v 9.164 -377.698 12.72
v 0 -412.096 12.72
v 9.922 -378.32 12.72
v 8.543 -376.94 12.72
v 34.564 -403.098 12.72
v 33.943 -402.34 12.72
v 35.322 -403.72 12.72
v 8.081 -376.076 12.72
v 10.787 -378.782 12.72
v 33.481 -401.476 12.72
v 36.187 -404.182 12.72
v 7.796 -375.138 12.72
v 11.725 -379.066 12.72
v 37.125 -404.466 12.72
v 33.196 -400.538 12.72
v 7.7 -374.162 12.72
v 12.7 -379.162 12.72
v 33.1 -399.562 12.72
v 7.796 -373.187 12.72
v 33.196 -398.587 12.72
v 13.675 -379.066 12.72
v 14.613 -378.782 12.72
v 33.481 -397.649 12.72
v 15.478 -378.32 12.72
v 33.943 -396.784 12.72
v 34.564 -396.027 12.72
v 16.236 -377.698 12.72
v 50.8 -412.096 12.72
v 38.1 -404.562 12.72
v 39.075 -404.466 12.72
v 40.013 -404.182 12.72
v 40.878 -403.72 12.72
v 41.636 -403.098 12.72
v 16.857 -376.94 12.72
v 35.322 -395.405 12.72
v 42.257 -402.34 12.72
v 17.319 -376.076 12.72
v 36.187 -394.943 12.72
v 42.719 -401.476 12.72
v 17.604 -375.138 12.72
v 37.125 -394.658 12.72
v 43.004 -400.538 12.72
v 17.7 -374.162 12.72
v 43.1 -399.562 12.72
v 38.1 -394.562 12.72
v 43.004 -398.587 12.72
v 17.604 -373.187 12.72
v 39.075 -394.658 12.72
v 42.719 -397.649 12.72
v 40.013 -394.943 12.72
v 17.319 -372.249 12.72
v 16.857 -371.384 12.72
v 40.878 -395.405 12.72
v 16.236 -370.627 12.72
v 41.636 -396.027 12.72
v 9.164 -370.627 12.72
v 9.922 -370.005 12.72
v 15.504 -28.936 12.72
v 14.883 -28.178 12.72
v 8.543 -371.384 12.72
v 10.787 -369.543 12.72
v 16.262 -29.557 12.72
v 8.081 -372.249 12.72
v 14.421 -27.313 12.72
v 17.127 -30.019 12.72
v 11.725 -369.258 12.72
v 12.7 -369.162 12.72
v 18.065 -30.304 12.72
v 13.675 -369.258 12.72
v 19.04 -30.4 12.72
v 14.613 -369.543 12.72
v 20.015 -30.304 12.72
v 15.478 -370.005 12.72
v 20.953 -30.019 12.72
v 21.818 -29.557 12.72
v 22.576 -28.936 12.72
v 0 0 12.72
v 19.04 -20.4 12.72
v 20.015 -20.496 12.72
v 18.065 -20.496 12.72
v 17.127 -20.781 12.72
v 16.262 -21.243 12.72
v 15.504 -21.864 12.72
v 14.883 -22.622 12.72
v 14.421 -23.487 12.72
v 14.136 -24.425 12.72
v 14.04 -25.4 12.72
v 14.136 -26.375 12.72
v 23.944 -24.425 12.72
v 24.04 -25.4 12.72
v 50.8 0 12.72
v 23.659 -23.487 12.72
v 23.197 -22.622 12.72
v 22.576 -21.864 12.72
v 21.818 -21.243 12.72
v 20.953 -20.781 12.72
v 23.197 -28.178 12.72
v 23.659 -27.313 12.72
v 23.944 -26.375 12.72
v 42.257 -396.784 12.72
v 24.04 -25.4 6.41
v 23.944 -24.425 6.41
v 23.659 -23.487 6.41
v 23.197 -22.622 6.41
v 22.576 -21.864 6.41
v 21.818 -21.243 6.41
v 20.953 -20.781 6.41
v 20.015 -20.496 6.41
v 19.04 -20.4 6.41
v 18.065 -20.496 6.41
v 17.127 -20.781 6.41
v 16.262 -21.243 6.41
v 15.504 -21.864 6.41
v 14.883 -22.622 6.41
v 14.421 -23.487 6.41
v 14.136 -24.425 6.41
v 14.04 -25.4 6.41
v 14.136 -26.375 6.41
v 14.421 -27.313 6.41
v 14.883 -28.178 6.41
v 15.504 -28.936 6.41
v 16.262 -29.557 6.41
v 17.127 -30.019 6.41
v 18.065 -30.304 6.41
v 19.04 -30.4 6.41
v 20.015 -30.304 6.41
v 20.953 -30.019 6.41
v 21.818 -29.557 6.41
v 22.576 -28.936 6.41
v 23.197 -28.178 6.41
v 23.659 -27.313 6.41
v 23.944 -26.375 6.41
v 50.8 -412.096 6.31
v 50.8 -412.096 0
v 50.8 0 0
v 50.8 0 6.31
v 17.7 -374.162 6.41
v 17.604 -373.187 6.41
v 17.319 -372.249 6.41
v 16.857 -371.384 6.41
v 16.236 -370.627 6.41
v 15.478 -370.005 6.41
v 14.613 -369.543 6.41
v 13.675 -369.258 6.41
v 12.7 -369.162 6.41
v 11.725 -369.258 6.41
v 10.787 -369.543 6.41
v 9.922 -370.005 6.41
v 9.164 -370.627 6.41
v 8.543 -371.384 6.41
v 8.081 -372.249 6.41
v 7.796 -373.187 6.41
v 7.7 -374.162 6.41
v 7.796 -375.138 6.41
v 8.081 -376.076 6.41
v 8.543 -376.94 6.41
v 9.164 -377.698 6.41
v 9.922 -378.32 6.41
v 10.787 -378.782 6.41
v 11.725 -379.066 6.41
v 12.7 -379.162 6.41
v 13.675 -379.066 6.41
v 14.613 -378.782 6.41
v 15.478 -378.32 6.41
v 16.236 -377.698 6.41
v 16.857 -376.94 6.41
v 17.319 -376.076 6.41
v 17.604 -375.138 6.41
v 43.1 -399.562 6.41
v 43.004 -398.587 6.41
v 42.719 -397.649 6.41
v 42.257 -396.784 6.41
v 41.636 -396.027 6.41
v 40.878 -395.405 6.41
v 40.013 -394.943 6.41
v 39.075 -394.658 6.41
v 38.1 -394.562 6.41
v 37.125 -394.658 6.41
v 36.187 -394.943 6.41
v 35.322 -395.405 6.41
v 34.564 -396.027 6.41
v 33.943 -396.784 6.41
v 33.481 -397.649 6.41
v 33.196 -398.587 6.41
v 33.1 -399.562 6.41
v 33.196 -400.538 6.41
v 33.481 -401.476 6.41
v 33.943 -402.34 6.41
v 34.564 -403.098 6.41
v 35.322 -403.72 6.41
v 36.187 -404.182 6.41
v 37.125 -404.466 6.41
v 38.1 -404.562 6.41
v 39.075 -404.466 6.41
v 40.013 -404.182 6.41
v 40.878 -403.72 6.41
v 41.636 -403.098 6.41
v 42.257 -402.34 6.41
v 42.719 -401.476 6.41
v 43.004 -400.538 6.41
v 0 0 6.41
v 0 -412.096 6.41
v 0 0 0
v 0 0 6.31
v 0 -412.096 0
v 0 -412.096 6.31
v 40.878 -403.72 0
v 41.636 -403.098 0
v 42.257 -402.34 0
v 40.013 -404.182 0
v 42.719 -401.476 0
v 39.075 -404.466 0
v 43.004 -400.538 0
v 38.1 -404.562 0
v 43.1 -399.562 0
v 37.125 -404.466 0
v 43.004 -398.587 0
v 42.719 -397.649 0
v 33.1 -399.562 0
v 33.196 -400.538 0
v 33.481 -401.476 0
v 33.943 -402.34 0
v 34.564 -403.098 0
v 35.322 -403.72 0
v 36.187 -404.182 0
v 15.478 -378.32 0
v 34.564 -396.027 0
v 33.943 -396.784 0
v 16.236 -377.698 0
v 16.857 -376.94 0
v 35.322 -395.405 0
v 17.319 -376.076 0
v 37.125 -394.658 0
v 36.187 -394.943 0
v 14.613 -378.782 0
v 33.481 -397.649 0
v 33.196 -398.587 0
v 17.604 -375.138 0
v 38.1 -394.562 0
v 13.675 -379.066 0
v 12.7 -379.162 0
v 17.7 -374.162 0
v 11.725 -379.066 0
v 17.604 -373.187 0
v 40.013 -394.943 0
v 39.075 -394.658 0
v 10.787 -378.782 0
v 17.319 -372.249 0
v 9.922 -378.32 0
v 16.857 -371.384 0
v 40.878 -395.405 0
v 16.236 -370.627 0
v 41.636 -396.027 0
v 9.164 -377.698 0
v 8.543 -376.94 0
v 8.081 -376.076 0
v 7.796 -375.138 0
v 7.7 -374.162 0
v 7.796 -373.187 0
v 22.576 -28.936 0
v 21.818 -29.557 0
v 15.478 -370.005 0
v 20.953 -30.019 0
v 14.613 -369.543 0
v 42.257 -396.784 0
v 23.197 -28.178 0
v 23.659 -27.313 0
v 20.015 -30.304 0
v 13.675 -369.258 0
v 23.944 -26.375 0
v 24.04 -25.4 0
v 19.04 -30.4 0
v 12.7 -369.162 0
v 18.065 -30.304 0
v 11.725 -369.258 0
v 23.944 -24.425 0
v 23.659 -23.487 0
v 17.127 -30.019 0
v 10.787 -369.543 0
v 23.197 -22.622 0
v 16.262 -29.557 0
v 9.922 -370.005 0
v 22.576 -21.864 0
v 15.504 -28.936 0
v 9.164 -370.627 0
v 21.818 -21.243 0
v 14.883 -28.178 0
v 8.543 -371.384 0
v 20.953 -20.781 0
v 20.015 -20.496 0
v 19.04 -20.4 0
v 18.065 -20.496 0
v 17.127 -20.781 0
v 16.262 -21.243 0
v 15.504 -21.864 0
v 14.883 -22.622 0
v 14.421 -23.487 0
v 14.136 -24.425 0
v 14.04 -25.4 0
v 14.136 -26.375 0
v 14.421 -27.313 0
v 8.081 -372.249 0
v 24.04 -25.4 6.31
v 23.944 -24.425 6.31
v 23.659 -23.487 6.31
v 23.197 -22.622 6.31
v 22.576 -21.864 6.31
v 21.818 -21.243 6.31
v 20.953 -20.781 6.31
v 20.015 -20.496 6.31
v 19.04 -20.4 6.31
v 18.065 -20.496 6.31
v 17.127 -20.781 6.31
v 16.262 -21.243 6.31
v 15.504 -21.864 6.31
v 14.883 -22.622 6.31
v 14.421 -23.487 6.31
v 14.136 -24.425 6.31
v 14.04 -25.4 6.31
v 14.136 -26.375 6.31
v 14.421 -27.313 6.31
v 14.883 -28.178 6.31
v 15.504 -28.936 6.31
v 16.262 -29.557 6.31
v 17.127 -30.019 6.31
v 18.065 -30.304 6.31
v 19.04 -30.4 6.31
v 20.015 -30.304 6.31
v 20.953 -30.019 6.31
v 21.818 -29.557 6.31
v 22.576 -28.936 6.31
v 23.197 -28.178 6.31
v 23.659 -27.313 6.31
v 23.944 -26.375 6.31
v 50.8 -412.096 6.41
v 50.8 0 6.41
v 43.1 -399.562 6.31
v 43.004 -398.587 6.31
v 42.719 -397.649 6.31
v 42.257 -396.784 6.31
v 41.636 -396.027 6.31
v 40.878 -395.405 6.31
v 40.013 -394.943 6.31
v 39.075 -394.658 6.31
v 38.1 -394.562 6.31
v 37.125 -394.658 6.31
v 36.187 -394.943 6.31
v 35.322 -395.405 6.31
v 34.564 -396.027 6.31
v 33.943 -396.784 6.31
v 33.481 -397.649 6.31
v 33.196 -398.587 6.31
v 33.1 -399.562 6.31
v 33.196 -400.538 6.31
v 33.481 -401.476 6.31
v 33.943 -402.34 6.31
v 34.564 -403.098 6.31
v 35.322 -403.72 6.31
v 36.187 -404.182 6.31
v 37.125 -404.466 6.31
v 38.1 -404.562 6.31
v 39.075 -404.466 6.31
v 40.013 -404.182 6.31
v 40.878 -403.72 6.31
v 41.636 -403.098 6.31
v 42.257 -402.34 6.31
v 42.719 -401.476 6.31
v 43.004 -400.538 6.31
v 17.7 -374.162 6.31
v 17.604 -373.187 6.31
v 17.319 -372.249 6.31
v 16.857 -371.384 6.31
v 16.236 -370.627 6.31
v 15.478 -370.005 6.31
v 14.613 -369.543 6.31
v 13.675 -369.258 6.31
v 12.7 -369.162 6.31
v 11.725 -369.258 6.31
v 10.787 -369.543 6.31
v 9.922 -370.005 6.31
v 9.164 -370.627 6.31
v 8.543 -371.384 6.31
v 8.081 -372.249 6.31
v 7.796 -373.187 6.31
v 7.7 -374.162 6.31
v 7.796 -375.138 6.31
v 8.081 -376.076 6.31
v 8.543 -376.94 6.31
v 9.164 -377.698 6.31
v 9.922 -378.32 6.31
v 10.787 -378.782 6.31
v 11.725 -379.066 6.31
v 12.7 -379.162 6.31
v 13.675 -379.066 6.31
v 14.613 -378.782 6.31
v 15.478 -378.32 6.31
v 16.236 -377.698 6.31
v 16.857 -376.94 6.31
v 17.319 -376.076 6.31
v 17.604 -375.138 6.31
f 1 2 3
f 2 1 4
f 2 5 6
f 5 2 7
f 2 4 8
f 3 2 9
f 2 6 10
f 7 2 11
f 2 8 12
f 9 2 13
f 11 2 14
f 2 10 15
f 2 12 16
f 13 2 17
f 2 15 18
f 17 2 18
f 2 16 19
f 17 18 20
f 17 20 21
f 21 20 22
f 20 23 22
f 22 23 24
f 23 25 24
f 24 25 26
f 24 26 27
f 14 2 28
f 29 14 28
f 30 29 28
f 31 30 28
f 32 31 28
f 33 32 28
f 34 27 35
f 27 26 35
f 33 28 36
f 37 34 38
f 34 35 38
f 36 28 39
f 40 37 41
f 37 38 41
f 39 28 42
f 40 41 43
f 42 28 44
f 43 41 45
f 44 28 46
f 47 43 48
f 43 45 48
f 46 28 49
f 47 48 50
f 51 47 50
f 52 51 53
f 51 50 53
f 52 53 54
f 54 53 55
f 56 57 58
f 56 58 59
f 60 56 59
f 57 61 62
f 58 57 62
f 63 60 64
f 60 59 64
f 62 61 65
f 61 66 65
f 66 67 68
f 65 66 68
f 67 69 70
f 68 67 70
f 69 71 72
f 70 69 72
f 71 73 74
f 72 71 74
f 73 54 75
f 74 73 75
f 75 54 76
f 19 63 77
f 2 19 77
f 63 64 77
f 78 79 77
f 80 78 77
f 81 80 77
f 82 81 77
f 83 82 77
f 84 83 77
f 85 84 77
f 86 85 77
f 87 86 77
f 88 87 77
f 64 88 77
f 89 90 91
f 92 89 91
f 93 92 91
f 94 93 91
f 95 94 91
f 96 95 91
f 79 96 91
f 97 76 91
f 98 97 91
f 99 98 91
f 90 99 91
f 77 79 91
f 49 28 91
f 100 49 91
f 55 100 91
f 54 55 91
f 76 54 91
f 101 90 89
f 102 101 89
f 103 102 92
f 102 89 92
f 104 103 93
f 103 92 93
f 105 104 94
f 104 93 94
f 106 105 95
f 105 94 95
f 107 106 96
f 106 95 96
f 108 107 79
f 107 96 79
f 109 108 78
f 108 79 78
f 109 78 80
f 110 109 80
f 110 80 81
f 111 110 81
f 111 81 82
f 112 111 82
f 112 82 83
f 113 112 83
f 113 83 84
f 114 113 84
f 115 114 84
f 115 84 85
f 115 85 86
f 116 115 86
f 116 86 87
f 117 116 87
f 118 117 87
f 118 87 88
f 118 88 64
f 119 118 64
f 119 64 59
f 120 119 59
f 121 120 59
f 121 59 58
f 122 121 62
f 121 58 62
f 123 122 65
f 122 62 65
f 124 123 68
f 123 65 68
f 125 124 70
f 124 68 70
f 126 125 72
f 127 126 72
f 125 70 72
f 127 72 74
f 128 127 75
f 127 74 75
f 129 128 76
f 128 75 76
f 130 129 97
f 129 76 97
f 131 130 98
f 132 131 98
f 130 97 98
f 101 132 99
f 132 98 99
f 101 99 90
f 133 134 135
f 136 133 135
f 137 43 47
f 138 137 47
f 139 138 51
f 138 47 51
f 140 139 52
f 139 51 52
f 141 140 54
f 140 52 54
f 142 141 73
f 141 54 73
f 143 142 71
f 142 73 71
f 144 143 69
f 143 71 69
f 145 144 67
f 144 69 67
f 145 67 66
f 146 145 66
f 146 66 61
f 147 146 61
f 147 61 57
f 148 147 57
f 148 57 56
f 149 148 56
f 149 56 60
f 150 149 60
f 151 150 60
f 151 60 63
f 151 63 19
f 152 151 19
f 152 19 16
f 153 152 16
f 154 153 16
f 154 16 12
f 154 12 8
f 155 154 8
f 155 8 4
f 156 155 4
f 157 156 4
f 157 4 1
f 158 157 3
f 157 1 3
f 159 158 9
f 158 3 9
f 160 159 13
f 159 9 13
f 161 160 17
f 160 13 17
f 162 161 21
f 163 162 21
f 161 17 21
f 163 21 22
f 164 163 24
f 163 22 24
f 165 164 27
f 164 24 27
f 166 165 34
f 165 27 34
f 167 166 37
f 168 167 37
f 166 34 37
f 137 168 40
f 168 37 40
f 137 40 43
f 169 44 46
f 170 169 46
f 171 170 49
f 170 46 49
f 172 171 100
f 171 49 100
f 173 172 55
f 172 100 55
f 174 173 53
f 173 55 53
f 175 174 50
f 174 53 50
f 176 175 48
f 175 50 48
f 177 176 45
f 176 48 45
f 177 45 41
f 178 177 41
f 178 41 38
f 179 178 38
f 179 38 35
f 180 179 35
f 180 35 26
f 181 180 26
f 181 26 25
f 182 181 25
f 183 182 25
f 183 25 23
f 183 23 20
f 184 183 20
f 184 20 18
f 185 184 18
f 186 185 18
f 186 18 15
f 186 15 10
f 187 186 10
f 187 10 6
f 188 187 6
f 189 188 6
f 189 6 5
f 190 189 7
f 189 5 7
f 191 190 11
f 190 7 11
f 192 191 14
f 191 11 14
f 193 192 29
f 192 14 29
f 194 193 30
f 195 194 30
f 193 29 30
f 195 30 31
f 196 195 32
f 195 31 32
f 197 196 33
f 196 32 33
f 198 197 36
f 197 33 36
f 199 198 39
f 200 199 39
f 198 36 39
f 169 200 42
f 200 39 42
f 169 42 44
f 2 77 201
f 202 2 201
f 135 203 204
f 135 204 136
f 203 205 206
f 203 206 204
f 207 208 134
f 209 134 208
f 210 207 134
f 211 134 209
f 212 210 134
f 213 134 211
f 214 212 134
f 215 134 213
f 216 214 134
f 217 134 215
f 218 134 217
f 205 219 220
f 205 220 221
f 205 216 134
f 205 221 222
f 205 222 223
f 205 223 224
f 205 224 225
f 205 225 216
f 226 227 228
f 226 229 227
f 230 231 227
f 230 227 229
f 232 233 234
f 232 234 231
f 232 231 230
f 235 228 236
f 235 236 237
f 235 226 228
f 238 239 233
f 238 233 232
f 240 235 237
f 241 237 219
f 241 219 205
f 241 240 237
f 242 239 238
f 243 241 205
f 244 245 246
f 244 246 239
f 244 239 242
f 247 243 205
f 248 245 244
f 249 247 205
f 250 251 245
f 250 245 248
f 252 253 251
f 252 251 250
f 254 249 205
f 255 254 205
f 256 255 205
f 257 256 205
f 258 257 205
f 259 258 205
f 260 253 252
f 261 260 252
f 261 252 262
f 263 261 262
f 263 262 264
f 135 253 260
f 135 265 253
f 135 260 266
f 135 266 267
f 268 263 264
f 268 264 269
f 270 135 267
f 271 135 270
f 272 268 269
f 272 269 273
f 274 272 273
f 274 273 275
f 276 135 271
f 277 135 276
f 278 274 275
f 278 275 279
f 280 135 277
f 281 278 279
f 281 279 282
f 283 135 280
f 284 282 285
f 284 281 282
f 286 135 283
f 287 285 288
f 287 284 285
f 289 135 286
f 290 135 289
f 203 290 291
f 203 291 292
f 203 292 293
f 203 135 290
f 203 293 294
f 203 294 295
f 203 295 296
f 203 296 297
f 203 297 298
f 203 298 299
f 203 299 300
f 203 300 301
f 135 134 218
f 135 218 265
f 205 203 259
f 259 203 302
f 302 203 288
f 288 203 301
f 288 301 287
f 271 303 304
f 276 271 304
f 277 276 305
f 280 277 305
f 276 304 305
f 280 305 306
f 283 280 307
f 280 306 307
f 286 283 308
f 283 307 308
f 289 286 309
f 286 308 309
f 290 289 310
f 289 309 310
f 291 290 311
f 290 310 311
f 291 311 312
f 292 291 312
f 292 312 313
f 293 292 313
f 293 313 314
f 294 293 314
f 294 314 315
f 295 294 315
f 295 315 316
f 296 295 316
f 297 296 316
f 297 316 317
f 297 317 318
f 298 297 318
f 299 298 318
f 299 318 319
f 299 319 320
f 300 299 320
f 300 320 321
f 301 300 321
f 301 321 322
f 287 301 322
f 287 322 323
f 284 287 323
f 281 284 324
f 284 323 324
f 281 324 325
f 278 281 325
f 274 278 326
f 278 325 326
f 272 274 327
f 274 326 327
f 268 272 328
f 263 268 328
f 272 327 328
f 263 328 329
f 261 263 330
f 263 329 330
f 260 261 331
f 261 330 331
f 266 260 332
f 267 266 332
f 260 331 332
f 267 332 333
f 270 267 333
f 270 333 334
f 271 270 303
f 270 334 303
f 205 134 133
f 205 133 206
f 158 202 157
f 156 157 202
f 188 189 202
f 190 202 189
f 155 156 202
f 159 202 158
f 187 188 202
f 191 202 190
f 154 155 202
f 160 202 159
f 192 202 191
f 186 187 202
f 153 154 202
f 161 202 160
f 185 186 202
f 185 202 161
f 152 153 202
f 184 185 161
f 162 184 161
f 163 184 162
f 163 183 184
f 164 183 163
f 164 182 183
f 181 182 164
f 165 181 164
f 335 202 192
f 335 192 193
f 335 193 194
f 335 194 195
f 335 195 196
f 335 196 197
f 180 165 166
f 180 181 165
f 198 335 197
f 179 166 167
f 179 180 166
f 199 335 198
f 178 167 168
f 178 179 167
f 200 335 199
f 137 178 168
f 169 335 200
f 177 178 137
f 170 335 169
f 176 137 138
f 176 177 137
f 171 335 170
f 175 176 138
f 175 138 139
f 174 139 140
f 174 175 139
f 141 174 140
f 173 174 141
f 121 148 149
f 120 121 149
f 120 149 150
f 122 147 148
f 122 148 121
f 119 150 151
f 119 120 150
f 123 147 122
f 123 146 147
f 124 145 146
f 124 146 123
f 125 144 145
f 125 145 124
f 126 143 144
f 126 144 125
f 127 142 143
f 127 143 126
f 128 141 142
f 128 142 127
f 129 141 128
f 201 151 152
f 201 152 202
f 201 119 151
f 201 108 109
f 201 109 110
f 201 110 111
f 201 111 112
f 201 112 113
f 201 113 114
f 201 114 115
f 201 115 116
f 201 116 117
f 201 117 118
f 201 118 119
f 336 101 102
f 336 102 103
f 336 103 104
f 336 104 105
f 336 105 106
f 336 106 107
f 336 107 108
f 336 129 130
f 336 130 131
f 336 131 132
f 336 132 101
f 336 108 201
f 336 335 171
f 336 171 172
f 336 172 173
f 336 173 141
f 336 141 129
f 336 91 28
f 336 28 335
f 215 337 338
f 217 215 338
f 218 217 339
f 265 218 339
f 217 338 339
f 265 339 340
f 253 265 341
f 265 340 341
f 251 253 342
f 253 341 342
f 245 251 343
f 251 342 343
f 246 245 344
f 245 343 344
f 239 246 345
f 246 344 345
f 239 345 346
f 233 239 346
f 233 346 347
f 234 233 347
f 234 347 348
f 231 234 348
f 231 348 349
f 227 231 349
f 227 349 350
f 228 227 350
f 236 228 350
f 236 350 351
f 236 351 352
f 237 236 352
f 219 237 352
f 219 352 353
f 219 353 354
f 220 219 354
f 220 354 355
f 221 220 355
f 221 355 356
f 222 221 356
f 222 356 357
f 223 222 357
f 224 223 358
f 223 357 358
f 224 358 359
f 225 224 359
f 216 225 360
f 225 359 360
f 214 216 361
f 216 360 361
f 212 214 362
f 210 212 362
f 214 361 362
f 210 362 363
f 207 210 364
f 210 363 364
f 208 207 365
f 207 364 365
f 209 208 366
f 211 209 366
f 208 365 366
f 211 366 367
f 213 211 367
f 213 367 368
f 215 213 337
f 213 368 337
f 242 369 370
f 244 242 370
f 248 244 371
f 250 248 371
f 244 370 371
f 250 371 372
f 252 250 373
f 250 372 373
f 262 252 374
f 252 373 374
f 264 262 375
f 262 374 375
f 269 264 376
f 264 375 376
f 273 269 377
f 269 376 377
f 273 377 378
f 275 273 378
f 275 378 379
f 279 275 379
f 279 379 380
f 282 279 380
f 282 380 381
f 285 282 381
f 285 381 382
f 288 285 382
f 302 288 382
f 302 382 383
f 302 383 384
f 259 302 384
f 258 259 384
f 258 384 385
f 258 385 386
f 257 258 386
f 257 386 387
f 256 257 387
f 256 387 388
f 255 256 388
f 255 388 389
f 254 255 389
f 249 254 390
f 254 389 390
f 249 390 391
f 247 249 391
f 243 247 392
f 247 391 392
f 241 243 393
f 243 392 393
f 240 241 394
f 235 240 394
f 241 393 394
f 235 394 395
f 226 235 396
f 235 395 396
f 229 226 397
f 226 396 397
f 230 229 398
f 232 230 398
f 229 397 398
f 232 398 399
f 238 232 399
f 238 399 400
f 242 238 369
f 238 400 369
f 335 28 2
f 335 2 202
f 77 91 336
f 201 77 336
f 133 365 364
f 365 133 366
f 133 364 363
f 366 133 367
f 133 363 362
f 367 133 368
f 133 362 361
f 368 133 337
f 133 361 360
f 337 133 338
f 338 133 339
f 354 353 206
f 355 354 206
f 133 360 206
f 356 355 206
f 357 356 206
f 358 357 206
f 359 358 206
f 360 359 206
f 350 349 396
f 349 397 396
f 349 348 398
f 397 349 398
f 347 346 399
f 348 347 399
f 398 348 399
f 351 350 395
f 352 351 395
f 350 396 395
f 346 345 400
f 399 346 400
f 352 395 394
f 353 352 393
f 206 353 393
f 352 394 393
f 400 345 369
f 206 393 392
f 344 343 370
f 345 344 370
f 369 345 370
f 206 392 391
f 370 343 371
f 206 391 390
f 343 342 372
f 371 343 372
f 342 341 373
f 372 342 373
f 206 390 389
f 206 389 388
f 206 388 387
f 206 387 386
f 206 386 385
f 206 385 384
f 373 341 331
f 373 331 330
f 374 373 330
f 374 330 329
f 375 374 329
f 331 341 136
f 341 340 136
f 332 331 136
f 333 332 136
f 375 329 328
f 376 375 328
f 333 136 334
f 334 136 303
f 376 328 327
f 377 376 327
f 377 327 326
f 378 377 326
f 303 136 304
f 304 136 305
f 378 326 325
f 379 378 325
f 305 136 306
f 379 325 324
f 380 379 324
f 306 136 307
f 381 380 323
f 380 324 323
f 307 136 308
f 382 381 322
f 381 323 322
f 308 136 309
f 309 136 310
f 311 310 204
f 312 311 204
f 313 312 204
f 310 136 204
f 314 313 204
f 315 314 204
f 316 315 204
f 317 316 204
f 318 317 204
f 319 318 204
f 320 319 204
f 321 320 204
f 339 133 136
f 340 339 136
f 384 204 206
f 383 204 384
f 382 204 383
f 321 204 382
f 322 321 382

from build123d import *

# Parameters (mm, degrees)
SALIENTE_EXTRUIR1_DEPTH = 6.31
CROQUIS3_W              = 6.31
CROQUIS3_H              = 412.09566061
SALIENTE_EXTRUIR2_DEPTH = 50.8
CROQUIS4_R              = 5
CORTAR_EXTRUIR1_DEPTH   = 31
CROQUIS5_R              = 5
CORTAR_EXTRUIR2_DEPTH   = 35


with BuildPart() as part:
    # Croquis2 → Saliente-Extruir1 (new body)
    with BuildSketch(Plane.XY):
        Polygon((0, 0), (50.8, 0), (50.8, -361.29566061), (50.8, -412.09566061), (0, -412.09566061), align=None)
    extrude(amount=SALIENTE_EXTRUIR1_DEPTH)


with BuildPart() as body_2:
    # Croquis3 → Saliente-Extruir2 (new body)
    with BuildSketch(Plane(origin=(50.8, 0, 0), x_dir=(0, 0, -1), z_dir=(1, 0, 0))):
        with Locations((-9.565, -206.047830305)):
            Rectangle(CROQUIS3_W, CROQUIS3_H)
    extrude(amount=-SALIENTE_EXTRUIR2_DEPTH)


with BuildPart() as cortar_extruir1_tool:
    # Croquis4 → Cortar-Extruir1 (new body)
    with BuildSketch(Plane.XY.offset(12.72)):
        with Locations((19.04, -25.4)):
            Circle(CROQUIS4_R)
    extrude(amount=-CORTAR_EXTRUIR1_DEPTH)


with BuildPart() as part_1:
    add(part.part)

    # Cortar-Extruir1: cut by cortar_extruir1_tool
    add(cortar_extruir1_tool.part, mode=Mode.SUBTRACT)


with BuildPart() as body_2_1:
    add(body_2.part)

    # Cortar-Extruir1: cut by cortar_extruir1_tool
    add(cortar_extruir1_tool.part, mode=Mode.SUBTRACT)


with BuildPart() as cortar_extruir2_tool:
    # Croquis5 → Cortar-Extruir2 (new body)
    with BuildSketch(Plane.XY.offset(12.72)):
        with Locations((12.7, -374.162201783)):
            Circle(CROQUIS5_R)
        with Locations((38.1, -399.562201783)):
            Circle(CROQUIS5_R)
    extrude(amount=-CORTAR_EXTRUIR2_DEPTH)


with BuildPart() as part_2:
    add(part_1.part)

    # Cortar-Extruir2: cut by cortar_extruir2_tool
    add(cortar_extruir2_tool.part, mode=Mode.SUBTRACT)


with BuildPart() as body_2_2:
    add(body_2_1.part)

    # Cortar-Extruir2: cut by cortar_extruir2_tool
    add(cortar_extruir2_tool.part, mode=Mode.SUBTRACT)


solid = Compound([part_2.part, body_2_2.part])
